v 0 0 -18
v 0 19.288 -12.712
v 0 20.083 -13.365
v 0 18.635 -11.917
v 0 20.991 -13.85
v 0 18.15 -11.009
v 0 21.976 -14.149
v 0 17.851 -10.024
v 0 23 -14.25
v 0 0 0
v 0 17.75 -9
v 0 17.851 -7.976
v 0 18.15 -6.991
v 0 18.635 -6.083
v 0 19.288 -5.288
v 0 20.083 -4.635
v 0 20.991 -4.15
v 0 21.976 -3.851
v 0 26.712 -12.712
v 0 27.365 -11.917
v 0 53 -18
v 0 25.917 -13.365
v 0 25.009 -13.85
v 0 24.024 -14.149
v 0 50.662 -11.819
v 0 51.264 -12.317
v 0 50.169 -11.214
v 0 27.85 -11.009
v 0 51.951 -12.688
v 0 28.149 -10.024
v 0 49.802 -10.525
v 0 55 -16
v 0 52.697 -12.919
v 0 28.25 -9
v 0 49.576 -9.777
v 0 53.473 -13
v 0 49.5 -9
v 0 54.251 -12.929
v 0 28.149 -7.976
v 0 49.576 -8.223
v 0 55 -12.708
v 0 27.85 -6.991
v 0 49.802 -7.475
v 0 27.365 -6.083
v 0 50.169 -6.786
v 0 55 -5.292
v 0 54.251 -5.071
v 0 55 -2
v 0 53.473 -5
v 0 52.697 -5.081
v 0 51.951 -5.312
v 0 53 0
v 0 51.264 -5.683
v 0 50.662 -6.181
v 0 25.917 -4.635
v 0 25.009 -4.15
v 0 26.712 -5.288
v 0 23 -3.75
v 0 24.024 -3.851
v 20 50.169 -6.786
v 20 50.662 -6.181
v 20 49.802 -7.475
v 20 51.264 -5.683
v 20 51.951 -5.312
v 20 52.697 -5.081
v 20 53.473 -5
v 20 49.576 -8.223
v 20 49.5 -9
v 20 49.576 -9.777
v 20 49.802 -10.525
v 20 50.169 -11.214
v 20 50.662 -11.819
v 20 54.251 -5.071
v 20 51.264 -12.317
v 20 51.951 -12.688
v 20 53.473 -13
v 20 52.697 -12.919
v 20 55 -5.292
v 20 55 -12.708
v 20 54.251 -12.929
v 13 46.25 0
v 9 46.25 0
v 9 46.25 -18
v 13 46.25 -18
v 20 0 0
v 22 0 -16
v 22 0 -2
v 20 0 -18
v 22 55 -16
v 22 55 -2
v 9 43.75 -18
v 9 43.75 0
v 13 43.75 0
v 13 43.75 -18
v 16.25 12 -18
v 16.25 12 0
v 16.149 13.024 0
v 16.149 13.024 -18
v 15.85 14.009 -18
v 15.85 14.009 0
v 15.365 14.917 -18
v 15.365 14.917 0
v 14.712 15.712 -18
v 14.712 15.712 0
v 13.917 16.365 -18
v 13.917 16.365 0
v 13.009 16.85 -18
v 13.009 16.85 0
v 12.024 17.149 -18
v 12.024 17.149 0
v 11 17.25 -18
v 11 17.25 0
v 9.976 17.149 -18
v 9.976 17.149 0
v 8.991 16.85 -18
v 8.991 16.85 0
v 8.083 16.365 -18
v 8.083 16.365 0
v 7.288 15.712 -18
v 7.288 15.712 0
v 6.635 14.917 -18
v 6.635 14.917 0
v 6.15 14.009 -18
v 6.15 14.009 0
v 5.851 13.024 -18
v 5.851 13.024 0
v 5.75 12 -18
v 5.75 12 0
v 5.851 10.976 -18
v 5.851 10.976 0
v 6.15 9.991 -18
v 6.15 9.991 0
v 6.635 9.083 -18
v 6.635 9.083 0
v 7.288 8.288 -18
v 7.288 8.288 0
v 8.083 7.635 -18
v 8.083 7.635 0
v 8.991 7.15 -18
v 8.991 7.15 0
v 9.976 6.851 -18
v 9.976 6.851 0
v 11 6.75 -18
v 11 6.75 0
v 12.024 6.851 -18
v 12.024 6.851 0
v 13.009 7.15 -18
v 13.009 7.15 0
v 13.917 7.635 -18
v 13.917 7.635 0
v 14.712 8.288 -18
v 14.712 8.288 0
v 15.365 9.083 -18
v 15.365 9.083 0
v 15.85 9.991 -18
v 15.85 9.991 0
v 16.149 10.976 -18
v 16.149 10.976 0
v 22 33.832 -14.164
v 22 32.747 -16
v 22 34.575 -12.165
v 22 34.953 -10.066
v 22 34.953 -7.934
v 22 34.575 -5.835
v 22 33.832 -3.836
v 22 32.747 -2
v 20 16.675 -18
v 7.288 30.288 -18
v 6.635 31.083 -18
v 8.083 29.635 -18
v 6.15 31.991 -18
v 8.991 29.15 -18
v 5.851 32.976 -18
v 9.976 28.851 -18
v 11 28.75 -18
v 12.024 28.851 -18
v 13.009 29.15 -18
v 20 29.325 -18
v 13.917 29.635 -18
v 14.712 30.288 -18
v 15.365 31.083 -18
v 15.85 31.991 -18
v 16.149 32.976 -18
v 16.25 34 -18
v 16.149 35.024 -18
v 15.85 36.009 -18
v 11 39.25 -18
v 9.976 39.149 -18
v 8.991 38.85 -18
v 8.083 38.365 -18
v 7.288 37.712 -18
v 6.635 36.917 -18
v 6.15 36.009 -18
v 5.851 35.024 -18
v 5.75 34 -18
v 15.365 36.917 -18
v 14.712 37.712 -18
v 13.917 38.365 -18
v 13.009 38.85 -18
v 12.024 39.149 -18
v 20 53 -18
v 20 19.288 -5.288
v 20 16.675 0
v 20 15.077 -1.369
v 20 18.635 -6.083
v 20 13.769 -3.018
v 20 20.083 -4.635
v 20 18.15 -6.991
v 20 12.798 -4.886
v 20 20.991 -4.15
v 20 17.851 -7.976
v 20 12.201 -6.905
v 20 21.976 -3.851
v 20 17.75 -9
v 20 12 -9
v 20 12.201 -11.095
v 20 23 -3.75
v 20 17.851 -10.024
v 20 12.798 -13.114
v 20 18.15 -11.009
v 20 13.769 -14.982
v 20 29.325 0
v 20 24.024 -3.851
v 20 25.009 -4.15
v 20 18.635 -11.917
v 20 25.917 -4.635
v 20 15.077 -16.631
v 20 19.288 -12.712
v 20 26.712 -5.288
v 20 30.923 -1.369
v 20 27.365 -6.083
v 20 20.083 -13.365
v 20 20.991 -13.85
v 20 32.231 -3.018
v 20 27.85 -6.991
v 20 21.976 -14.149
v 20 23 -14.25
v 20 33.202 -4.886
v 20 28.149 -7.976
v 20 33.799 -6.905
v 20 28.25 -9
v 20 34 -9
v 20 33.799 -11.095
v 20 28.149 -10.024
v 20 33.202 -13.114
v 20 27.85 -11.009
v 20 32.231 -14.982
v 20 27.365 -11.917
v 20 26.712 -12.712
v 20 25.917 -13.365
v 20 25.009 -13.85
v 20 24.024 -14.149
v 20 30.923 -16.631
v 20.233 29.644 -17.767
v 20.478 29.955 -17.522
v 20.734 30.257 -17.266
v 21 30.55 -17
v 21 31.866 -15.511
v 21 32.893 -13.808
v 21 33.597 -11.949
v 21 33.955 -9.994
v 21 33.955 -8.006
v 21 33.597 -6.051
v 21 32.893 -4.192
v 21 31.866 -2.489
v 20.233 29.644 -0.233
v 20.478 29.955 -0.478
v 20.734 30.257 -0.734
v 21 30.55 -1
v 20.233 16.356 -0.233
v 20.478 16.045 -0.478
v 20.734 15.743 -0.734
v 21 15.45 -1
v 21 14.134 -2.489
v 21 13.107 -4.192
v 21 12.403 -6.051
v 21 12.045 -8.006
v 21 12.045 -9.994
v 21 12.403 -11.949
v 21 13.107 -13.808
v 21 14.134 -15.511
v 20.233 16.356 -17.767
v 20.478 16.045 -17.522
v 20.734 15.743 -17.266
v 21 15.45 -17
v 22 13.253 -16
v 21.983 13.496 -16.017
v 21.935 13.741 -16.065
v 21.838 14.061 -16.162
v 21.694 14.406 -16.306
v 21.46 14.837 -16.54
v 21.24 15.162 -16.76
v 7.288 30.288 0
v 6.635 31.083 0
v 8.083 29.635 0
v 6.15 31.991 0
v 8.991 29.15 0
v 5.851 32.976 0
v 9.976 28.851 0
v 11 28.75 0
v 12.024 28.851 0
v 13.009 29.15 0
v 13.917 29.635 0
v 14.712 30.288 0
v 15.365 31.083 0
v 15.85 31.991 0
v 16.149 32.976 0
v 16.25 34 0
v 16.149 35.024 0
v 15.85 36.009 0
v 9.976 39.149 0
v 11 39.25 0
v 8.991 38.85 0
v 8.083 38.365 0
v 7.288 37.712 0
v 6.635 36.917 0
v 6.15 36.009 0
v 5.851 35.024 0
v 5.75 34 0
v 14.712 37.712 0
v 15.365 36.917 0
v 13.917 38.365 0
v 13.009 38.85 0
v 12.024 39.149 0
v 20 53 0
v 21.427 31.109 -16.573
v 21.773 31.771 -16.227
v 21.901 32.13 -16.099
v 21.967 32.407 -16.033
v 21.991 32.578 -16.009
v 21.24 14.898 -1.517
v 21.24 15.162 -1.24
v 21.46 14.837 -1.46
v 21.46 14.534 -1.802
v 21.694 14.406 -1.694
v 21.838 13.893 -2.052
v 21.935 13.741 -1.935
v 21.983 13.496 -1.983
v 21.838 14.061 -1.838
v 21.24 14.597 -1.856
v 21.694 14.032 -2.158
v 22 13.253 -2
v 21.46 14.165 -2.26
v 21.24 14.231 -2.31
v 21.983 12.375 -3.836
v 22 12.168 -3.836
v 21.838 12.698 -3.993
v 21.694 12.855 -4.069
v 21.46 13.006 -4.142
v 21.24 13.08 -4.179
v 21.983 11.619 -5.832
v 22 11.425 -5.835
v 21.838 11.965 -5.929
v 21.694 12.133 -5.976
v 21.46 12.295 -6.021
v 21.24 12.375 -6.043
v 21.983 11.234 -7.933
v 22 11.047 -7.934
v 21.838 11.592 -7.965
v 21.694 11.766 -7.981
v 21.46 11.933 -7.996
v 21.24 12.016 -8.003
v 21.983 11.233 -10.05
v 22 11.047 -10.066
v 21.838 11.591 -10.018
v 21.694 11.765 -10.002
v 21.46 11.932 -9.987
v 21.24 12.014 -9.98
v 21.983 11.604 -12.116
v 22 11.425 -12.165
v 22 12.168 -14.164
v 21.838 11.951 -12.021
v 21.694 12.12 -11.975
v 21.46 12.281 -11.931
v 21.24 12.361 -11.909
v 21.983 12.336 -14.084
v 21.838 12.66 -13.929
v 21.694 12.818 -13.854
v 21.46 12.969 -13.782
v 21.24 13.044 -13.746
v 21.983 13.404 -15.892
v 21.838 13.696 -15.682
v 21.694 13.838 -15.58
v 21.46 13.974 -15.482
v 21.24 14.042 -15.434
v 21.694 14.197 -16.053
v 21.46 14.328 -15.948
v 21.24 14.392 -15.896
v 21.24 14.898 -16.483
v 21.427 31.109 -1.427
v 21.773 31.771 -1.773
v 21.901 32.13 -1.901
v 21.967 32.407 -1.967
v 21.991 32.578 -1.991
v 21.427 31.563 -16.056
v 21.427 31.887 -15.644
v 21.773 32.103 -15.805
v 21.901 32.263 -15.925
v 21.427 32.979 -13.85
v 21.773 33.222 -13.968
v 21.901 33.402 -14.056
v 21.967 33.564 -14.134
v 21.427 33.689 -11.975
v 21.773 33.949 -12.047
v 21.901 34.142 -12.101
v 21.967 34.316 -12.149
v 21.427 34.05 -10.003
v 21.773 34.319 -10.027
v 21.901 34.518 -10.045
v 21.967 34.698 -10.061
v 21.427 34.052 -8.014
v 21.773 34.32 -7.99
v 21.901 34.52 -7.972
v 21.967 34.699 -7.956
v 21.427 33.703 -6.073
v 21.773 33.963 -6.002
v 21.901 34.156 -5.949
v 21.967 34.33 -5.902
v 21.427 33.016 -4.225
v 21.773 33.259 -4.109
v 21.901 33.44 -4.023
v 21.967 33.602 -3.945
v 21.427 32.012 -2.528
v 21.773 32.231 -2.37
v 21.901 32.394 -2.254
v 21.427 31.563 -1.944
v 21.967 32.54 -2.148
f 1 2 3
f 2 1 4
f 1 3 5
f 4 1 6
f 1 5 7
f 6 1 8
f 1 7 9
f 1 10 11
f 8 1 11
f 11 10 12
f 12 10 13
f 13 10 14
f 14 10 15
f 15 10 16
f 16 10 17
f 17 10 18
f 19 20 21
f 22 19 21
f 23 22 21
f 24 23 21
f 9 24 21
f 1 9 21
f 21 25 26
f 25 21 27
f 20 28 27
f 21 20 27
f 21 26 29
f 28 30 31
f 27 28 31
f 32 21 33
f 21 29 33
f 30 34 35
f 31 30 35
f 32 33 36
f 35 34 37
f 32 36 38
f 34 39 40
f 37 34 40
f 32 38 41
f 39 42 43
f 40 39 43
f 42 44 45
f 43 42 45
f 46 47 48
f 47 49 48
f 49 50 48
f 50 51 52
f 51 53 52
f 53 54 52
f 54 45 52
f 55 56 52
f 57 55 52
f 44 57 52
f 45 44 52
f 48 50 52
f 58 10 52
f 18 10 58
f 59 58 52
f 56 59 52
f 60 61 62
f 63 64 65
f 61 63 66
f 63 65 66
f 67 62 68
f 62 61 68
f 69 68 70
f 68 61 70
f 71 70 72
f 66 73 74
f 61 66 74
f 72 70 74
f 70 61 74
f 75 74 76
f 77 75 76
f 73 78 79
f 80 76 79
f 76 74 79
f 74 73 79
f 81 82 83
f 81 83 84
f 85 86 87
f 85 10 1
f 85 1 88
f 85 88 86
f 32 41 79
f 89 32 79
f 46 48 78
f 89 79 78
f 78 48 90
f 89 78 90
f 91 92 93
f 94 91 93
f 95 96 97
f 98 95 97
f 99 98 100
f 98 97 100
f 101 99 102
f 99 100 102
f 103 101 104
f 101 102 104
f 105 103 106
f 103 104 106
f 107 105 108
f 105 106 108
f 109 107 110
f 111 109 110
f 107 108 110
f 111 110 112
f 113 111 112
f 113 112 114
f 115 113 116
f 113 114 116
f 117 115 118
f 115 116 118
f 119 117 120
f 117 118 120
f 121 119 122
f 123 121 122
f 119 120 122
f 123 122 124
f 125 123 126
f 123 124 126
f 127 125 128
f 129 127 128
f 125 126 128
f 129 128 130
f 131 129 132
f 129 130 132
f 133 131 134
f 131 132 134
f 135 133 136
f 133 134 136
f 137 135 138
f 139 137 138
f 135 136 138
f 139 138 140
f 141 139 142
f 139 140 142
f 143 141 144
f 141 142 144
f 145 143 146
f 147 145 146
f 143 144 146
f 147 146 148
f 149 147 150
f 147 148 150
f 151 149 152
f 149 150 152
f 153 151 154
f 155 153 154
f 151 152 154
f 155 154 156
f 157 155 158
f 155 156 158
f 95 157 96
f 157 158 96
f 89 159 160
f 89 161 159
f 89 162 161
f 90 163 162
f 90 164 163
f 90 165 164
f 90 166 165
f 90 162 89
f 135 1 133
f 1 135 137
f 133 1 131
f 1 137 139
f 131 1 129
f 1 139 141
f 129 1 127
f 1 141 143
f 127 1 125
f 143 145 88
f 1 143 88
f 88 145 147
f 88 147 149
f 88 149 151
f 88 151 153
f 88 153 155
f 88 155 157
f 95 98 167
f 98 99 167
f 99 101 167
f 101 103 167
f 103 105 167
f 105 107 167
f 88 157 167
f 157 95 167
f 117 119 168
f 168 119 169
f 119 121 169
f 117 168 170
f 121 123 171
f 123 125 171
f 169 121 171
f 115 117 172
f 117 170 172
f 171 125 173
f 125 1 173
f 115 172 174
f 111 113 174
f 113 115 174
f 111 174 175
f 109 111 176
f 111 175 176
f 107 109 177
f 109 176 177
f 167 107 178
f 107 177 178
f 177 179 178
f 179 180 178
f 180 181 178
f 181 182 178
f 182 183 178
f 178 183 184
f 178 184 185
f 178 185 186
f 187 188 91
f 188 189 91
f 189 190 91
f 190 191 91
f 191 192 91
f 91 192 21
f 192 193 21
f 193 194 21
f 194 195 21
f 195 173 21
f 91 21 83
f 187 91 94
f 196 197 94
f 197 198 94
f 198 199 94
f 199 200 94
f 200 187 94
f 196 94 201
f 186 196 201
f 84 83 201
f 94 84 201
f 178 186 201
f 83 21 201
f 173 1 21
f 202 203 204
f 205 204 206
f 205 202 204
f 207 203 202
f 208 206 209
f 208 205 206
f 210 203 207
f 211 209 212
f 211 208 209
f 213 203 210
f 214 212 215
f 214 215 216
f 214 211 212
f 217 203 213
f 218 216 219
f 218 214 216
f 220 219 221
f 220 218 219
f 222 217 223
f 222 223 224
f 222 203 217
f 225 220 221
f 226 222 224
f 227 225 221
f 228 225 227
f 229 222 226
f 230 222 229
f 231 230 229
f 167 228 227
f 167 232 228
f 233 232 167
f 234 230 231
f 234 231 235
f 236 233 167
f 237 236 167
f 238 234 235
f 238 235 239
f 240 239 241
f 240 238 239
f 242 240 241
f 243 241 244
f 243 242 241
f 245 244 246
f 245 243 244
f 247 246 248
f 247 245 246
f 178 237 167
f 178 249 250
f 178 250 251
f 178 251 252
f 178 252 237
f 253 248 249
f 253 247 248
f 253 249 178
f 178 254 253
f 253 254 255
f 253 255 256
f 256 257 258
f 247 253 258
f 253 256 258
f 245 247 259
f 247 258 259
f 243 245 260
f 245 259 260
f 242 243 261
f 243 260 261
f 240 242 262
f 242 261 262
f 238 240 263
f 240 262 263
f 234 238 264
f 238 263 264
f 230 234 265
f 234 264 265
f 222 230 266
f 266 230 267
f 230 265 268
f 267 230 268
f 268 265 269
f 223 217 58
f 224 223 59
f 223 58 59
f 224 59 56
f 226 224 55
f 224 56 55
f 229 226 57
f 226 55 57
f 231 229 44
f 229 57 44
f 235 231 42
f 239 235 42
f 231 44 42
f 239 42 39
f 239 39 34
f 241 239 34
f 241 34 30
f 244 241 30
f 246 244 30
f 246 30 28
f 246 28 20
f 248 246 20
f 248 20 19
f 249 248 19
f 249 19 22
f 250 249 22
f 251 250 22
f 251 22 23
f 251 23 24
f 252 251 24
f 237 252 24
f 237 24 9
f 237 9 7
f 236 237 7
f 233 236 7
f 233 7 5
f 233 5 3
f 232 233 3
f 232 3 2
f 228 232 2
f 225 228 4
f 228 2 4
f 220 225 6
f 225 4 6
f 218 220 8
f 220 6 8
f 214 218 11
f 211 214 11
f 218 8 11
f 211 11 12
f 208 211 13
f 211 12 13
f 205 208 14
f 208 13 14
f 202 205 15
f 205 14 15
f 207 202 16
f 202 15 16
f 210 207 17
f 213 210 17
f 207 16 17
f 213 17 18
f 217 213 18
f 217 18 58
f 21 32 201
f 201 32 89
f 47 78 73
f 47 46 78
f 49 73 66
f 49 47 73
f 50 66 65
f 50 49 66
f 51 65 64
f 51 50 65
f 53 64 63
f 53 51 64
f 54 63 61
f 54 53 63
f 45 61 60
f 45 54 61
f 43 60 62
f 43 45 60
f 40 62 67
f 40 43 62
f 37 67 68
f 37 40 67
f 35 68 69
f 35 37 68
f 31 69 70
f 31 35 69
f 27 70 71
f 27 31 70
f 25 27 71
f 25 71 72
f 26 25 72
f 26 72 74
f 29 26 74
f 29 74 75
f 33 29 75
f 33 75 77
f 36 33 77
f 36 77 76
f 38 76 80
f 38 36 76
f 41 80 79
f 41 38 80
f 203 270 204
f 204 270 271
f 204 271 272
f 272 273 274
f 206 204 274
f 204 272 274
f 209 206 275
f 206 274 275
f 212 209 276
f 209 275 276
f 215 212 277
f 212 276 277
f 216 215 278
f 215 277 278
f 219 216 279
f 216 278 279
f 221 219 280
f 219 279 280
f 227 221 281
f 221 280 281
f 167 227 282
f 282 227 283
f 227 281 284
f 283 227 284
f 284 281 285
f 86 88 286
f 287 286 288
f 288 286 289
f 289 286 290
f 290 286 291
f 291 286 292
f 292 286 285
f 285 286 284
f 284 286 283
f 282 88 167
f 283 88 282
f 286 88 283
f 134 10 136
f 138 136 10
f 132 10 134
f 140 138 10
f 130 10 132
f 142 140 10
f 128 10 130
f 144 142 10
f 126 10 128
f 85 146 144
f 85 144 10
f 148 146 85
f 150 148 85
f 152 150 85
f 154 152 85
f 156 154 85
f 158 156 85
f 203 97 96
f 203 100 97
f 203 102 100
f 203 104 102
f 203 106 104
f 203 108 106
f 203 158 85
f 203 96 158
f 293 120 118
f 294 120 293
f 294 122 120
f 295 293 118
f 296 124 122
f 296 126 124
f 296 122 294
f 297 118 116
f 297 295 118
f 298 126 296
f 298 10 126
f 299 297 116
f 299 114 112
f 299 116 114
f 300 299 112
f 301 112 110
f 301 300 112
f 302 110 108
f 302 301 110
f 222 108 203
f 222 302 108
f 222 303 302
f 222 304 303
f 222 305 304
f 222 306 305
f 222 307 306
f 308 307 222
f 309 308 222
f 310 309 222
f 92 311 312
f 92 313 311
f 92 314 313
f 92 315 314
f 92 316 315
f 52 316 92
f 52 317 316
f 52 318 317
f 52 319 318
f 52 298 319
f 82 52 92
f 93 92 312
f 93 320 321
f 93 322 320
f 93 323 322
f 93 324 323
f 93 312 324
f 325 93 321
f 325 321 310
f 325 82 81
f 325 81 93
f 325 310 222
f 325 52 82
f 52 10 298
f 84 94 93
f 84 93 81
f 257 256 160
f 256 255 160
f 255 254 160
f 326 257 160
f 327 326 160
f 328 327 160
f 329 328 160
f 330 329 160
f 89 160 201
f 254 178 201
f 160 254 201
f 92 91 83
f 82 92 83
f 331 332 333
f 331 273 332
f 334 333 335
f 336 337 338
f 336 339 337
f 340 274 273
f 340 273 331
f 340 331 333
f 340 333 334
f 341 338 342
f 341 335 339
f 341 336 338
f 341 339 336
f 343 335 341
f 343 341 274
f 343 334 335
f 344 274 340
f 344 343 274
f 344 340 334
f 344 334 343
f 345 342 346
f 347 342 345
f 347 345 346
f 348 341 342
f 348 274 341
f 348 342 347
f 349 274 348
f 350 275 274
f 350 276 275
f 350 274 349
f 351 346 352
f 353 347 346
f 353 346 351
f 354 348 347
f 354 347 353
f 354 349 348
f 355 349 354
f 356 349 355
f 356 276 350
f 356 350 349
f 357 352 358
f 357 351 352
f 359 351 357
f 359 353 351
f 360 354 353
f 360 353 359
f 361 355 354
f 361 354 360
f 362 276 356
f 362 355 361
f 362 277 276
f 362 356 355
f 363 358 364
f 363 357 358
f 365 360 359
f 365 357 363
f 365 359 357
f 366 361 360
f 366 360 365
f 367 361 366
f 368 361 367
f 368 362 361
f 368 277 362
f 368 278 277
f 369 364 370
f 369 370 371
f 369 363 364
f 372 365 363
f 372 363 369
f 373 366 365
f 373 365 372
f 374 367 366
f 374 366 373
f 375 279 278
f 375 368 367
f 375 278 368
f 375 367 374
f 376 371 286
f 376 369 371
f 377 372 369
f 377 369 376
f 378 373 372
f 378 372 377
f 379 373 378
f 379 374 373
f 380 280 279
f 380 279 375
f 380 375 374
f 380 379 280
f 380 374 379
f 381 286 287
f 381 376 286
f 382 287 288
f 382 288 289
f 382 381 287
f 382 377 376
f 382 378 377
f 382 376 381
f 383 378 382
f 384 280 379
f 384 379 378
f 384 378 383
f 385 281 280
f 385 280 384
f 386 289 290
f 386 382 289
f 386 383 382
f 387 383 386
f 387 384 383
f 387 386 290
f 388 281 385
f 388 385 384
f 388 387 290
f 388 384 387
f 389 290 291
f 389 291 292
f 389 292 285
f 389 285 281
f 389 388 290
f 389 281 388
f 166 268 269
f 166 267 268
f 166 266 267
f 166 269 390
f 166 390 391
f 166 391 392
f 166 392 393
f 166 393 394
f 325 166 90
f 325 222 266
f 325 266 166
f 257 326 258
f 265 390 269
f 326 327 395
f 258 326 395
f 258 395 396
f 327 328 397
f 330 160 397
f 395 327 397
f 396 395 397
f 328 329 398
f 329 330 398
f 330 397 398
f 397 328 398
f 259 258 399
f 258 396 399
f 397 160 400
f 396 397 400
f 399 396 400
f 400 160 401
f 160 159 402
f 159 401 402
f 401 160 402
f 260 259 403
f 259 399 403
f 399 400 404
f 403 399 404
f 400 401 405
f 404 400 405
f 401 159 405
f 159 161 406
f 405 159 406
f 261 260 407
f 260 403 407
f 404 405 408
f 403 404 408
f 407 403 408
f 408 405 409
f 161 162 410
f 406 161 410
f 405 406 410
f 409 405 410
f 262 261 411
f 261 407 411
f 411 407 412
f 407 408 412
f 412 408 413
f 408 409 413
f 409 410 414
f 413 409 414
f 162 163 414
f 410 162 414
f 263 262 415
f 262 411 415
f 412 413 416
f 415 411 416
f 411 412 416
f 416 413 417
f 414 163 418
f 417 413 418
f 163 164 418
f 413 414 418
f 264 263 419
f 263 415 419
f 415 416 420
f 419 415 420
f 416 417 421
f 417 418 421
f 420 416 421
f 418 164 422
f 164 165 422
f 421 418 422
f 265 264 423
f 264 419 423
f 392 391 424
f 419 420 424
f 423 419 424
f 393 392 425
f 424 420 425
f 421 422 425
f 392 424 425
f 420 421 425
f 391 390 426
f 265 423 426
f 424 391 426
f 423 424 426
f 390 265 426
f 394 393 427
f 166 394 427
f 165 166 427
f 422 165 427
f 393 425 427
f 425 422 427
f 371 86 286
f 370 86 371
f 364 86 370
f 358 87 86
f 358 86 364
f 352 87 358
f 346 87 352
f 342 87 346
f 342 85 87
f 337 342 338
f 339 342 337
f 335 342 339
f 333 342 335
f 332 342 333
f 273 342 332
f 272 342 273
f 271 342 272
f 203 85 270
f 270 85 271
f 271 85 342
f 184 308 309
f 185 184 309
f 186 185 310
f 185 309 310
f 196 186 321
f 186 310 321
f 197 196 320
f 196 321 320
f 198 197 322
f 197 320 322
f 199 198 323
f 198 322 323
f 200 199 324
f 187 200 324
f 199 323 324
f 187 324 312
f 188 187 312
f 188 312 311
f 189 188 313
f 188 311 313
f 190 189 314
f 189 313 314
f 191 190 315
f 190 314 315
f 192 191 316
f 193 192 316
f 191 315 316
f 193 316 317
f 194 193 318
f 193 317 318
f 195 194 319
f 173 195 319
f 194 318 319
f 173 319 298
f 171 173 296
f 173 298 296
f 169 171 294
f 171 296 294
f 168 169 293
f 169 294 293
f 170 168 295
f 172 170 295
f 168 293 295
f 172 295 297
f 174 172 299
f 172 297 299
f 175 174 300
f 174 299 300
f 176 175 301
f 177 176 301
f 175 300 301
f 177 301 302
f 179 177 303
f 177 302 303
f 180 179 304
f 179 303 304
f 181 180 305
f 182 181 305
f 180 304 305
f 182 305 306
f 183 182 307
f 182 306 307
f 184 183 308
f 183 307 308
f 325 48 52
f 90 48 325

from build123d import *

# Parameters (mm, degrees)
SKETCH1_W           = 22
SKETCH1_H           = 55
SKETCH1_R           = 5.25
SKETCH1_W_2         = 4
SKETCH1_H_2         = 2.5
BOSS_EXTRUDE1_DEPTH = 18
SKETCH2_R           = 5.25
CUT_EXTRUDE1_DEPTH  = 23
SKETCH3_R           = 4
CUT_EXTRUDE2_DEPTH  = 20
CHAMFER1_SIZE       = 2
SKETCH4_R           = 11
CUT_EXTRUDE3_DEPTH  = 2
FILLET1_R           = 1
CHAMFER2_SIZE       = 2


with BuildPart() as part:
    # Sketch1 → Boss-Extrude1 (new body)
    with BuildSketch(Plane.XY):
        with Locations((11, 27.5)):
            Rectangle(SKETCH1_W, SKETCH1_H)
        with Locations((11, 12)):
            Circle(SKETCH1_R, mode=Mode.SUBTRACT)
        with Locations((11, 34)):
            Circle(SKETCH1_R, mode=Mode.SUBTRACT)
        with Locations((11, 45)):
            Rectangle(SKETCH1_W_2, SKETCH1_H_2, mode=Mode.SUBTRACT)
    extrude(amount=-BOSS_EXTRUDE1_DEPTH)

    # Sketch2 → Cut-Extrude1 (cut, through all)
    with BuildSketch(Plane.ZY):
        with Locations((-9, 23)):
            Circle(SKETCH2_R)
    extrude(amount=-CUT_EXTRUDE1_DEPTH, mode=Mode.SUBTRACT)

    # Sketch3 → Cut-Extrude2 (cut)
    with BuildSketch(Plane(origin=(0, 0, 0), x_dir=(0, 0, -1), z_dir=(1, 0, 0))):
        with Locations((9, 53.5)):
            Circle(SKETCH3_R)
    extrude(amount=CUT_EXTRUDE2_DEPTH, mode=Mode.SUBTRACT)

    # Chamfer1
    chamfer1_edges = [part.edges().sort_by_distance(p)[0] for p in [
        (22, 27.5, 0),
        (22, 27.5, -18),
    ]]
    chamfer(chamfer1_edges, length=CHAMFER1_SIZE)

    # Sketch4 → Cut-Extrude3 (cut)
    with BuildSketch(Plane(origin=(22, 0, 0), x_dir=(0, 0, -1), z_dir=(1, 0, 0))):
        with Locations((9, 23)):
            Circle(SKETCH4_R)
    extrude(amount=-CUT_EXTRUDE3_DEPTH, mode=Mode.SUBTRACT)

    # Fillet1
    fillet1_edges = [part.edges().sort_by_distance(p)[0] for p in [
        (22, 34, -9),
        (22, 12, -9),
    ]]
    fillet(fillet1_edges, radius=FILLET1_R)

    # Chamfer2
    chamfer2_edges = [part.edges().sort_by_distance(p)[0] for p in [
        (10, 55, 0),
        (10, 55, -18),
    ]]
    chamfer(chamfer2_edges, length=CHAMFER2_SIZE)


solid = part.part
